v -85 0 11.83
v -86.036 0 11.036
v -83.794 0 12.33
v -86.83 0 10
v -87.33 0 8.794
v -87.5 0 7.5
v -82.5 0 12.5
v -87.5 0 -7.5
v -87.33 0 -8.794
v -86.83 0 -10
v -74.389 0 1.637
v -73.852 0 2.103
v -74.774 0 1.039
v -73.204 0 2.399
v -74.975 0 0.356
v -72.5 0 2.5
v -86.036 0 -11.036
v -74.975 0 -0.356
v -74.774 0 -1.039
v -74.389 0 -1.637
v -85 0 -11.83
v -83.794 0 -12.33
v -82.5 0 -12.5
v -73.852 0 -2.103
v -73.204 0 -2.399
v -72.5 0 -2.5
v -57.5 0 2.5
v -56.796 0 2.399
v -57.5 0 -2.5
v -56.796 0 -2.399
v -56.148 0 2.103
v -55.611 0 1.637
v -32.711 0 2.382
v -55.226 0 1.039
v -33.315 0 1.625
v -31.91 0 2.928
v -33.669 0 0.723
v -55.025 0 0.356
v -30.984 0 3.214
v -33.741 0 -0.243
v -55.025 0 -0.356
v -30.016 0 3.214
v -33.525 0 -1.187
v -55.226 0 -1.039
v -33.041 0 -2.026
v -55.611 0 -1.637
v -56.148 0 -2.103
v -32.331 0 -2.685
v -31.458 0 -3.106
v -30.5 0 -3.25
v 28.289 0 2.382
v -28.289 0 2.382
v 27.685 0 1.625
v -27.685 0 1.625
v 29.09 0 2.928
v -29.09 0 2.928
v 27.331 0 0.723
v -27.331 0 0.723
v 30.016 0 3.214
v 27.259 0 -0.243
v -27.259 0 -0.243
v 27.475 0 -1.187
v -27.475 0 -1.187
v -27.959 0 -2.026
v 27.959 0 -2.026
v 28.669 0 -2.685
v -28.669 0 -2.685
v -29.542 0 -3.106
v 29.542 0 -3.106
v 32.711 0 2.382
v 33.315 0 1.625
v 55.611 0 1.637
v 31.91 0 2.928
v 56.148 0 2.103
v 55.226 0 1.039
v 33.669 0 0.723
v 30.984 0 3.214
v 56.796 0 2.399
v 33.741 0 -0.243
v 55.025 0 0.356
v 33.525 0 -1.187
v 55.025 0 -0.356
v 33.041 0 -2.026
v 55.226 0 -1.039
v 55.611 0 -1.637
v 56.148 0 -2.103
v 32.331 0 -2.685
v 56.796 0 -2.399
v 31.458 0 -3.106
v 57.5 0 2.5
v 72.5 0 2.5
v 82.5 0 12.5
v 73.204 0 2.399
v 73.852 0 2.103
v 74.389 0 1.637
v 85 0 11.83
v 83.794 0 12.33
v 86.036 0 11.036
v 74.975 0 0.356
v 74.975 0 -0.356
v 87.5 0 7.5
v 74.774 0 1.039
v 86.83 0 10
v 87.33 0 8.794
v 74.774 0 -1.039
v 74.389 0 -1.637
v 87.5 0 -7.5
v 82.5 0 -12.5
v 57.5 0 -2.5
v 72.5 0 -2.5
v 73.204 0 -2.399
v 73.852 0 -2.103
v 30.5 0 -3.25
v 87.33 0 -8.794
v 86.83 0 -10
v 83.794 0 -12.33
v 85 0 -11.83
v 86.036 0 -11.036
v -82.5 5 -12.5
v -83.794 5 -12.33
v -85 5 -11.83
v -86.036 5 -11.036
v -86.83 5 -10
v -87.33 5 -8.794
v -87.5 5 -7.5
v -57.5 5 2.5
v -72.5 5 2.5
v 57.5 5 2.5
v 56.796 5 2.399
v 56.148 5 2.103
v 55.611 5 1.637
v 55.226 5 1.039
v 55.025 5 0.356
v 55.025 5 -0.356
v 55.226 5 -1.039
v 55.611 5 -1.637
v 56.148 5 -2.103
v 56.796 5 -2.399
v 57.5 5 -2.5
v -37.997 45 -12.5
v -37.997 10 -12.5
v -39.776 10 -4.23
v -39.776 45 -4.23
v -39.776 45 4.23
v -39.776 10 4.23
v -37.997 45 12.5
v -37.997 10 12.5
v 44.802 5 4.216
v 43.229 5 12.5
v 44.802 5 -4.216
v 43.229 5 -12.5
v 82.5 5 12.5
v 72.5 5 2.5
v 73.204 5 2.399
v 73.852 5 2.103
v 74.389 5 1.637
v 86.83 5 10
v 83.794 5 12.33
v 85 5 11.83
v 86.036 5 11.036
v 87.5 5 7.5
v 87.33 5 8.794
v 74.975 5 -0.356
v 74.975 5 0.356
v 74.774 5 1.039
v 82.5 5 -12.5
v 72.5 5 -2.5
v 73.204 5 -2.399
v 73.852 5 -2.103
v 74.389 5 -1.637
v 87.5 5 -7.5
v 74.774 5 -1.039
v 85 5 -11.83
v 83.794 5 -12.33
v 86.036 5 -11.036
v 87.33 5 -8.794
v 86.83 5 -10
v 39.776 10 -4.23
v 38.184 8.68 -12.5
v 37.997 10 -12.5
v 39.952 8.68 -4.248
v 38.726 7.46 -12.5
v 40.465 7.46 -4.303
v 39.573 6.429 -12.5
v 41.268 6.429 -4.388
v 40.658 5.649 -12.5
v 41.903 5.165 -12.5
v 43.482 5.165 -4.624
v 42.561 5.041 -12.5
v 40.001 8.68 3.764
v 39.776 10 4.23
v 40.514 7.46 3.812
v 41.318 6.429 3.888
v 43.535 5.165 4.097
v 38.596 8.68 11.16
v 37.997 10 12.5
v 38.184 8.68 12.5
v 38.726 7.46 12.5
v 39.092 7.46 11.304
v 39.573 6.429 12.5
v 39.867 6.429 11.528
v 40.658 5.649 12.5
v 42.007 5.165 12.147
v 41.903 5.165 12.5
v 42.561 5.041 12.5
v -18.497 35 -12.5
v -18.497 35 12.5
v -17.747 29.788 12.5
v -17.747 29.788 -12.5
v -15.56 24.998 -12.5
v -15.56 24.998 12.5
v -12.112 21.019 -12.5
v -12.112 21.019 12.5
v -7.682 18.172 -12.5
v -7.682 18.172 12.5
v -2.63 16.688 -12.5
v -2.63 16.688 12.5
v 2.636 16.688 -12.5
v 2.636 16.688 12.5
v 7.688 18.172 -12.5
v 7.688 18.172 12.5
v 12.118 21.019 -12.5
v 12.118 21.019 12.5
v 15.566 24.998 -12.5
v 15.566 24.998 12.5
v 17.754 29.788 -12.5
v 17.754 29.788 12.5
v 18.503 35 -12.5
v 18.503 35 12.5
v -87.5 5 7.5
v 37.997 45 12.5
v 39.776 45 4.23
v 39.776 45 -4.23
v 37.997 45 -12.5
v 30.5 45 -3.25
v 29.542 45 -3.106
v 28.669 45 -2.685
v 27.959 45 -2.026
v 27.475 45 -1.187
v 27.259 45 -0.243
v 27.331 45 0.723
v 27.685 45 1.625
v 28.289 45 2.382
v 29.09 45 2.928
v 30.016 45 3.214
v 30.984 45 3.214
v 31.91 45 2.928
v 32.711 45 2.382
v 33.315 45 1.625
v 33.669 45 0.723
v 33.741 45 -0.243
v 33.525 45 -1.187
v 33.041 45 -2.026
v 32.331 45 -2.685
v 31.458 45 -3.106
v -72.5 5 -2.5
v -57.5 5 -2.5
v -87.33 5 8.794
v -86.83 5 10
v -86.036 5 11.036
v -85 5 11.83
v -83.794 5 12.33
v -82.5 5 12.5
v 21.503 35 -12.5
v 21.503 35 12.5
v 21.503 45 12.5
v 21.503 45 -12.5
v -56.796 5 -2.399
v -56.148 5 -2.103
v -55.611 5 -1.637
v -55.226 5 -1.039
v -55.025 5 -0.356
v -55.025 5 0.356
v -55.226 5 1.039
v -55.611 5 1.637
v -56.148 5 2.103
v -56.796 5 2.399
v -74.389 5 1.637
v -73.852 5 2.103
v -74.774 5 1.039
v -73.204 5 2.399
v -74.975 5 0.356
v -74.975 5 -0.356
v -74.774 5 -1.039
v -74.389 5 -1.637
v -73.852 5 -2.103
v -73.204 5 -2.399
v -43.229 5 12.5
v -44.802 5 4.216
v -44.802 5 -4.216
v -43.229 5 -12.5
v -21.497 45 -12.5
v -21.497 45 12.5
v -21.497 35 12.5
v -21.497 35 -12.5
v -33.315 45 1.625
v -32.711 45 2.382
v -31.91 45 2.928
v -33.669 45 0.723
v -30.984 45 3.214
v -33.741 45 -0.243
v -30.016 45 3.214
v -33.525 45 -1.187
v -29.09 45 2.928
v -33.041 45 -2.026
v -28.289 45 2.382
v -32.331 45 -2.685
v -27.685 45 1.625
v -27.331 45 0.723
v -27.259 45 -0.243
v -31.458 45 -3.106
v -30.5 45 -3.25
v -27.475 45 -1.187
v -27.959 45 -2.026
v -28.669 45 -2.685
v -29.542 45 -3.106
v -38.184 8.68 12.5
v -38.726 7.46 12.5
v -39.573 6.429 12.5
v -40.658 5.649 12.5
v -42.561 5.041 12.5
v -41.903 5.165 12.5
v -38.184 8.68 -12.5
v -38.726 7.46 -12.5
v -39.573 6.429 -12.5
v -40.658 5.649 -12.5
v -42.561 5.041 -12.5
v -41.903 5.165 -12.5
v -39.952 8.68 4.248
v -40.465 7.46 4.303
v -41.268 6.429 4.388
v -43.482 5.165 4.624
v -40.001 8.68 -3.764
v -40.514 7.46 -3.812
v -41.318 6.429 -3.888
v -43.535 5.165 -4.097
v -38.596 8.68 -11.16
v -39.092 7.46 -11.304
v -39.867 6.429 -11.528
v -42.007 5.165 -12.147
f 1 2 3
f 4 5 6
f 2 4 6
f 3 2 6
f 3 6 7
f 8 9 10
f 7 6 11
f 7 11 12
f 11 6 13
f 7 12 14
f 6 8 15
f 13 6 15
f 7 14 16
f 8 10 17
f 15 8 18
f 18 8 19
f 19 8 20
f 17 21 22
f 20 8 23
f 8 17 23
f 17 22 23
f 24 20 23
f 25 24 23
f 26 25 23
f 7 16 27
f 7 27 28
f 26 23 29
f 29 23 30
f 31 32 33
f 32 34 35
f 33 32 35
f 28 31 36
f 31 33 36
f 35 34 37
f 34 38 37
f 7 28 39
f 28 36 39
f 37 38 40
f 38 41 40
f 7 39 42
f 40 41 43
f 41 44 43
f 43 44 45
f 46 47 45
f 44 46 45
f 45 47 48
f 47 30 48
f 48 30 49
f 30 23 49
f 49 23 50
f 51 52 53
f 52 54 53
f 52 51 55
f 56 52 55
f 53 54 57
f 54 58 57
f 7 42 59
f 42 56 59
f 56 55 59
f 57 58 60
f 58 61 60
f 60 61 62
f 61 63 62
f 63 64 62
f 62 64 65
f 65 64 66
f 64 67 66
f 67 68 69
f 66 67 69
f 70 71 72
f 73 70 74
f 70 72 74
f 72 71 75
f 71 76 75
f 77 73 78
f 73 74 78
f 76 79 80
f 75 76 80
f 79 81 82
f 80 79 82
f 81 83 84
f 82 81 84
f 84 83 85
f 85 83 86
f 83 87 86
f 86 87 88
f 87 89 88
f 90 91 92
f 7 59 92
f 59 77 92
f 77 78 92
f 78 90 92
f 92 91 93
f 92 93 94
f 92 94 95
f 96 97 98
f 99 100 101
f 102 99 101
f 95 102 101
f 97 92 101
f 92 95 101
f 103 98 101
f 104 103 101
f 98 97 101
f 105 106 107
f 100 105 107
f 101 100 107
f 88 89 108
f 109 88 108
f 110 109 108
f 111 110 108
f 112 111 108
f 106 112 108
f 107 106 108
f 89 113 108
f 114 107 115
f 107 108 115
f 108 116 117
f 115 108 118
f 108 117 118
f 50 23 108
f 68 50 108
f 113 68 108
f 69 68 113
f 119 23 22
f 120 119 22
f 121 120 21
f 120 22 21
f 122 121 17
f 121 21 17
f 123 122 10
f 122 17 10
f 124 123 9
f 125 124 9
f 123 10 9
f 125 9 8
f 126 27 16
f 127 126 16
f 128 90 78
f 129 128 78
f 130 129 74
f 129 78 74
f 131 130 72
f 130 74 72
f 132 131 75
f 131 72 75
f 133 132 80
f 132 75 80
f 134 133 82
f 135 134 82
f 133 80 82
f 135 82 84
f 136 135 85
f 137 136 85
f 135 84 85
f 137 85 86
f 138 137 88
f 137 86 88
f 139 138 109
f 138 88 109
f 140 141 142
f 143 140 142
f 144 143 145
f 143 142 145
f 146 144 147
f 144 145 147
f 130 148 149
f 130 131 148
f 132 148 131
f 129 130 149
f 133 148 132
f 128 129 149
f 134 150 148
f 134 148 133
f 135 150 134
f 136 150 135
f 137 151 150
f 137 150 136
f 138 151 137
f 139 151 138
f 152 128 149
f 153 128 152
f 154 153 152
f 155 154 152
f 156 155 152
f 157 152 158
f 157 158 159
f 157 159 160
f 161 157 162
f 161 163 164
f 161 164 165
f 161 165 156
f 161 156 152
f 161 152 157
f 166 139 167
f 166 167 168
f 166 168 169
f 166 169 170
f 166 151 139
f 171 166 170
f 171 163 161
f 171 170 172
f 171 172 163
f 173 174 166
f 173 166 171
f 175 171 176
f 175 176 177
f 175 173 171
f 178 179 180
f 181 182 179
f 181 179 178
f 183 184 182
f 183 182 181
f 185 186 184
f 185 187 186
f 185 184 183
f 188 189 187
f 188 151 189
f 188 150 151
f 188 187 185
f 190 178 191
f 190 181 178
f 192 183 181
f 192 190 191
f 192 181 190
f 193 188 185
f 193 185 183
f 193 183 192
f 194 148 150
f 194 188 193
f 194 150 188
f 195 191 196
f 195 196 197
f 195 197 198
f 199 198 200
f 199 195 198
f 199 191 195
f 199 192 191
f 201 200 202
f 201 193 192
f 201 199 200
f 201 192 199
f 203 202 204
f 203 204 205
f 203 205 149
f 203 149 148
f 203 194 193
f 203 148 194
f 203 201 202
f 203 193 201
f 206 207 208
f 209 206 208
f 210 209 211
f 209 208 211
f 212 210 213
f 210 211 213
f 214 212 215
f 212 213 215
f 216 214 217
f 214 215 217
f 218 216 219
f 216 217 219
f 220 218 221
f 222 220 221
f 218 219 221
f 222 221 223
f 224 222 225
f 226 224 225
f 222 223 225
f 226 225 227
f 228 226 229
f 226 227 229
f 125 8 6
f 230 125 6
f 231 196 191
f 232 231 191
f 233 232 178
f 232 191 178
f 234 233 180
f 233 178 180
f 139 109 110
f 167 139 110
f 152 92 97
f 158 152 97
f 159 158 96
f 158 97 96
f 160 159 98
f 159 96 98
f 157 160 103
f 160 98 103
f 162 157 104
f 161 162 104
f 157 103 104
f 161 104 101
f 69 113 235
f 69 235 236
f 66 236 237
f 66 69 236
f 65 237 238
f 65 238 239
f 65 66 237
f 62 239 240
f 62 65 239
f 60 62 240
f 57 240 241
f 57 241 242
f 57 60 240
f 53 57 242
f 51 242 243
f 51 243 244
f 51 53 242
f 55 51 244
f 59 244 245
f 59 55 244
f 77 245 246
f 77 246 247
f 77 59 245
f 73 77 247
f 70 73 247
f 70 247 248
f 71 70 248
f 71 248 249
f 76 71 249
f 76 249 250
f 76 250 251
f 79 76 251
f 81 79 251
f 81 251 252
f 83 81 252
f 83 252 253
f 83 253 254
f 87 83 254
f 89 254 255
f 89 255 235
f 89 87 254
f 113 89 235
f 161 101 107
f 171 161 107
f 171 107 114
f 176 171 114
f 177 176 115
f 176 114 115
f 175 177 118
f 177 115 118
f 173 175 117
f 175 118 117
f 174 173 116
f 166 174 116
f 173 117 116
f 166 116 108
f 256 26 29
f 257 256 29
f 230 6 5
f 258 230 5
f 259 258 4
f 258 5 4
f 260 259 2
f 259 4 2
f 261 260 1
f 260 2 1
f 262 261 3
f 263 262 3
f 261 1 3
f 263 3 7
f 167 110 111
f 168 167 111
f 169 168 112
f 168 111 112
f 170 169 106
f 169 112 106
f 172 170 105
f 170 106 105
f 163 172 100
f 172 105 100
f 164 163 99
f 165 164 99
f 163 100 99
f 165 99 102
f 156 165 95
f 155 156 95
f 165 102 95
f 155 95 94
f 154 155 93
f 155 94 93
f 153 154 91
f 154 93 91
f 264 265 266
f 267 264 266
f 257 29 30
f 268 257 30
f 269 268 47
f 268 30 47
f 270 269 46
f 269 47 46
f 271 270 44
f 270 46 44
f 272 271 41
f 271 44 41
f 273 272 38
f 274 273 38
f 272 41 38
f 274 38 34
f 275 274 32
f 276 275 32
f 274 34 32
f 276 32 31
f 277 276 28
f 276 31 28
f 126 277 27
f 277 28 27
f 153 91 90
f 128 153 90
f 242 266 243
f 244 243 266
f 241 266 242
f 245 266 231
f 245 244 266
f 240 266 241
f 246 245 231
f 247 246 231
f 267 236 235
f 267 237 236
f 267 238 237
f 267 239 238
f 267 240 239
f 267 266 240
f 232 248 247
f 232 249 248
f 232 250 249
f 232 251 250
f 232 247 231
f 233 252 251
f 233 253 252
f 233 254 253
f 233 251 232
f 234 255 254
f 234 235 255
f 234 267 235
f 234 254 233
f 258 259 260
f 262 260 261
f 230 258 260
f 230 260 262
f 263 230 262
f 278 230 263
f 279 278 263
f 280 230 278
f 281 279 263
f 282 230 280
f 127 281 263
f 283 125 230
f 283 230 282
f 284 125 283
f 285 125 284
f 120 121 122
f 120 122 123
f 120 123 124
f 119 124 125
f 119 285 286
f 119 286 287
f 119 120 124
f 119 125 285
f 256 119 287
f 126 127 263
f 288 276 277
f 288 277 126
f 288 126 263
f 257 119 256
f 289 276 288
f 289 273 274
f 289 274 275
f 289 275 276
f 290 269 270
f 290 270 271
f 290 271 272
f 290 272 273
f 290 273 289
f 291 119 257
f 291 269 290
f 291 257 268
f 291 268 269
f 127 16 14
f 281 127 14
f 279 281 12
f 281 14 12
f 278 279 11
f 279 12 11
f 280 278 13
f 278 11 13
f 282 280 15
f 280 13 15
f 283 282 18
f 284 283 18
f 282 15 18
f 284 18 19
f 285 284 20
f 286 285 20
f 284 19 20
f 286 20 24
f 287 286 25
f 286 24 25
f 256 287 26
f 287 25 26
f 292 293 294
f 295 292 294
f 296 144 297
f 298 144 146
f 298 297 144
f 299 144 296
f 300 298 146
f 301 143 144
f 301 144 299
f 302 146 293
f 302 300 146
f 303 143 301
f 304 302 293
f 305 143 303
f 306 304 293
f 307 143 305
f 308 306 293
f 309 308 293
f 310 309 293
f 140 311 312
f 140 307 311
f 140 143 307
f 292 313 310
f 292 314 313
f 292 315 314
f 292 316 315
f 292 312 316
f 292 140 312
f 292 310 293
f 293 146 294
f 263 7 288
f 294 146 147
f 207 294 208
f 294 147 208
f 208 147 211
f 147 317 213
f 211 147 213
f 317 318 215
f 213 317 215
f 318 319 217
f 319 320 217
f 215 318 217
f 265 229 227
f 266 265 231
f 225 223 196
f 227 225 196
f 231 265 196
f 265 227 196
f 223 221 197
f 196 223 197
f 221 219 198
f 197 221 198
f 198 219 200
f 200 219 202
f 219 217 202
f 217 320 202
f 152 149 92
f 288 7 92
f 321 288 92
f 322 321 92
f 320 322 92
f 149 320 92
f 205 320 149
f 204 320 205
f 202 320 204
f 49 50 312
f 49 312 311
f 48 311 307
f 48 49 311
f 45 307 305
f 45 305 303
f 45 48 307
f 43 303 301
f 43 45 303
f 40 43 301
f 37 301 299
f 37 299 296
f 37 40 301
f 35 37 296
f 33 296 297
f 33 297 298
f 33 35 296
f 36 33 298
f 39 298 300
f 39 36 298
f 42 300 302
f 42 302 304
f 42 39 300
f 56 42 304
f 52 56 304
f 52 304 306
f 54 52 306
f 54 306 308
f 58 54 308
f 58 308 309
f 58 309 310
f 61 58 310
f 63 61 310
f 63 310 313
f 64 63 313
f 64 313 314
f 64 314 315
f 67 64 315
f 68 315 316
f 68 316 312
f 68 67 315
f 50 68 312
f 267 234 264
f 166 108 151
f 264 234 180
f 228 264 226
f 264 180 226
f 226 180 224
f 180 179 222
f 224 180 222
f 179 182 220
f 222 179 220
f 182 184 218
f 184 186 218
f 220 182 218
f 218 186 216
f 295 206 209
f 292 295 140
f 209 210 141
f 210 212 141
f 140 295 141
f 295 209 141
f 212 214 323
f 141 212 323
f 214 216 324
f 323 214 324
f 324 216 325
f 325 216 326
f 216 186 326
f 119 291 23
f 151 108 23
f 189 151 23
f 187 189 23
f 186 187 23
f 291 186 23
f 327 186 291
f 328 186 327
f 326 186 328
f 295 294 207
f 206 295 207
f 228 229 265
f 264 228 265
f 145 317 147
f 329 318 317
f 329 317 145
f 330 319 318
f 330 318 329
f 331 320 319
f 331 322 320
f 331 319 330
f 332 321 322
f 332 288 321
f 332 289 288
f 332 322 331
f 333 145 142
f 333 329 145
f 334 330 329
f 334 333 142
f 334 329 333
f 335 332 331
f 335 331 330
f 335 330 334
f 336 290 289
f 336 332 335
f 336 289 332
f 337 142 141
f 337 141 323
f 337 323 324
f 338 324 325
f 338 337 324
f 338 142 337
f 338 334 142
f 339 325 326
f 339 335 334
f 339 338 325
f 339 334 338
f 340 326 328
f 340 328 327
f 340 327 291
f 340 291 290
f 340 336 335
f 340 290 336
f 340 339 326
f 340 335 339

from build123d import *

# Parameters (mm, degrees)
BOSS_EXTRUDE5_DEPTH   = 5
BOSS_EXTRUDE5_2_DEPTH = 5
SKETCH1_8_R           = 3.25
BOSS_EXTRUDE6_DEPTH   = 45
FILLET3_R             = 5
FILLET4_R             = 5
CUT_EXTRUDE1_DEPTH    = 45


with BuildPart() as part:
    # Sketch1 → Boss-Extrude5 (new body)
    with BuildSketch(Plane(origin=(0, 0, 0), x_dir=(1, 0, 0), z_dir=(0, 1, 0))):
        with BuildLine():
            ThreePointArc((-82.5, 12.5), (-86.035533906, 11.035533906), (-87.5, 7.5))
            Line((-87.5, 7.5), (-87.5, -7.5))
            ThreePointArc((-87.5, -7.5), (-86.035533906, -11.035533906), (-82.5, -12.5))
            Line((-82.5, -12.5), (-37.996710384, -12.5))
            ThreePointArc((-37.996710384, -12.5), (-40, 0), (-37.996710384, 12.5))
            Line((-37.996710384, 12.5), (-82.5, 12.5))
        make_face()
        with BuildLine():
            ThreePointArc((-72.5, -2.5), (-75, 0), (-72.5, 2.5))
            Line((-72.5, 2.5), (-57.5, 2.5))
            ThreePointArc((-57.5, 2.5), (-55, 0), (-57.5, -2.5))
            Line((-57.5, -2.5), (-72.5, -2.5))
        make_face(mode=Mode.SUBTRACT)
    extrude(amount=BOSS_EXTRUDE5_DEPTH)



with BuildPart() as body_2:
    # Sketch1 → Boss-Extrude5 2 (new body)
    with BuildSketch(Plane(origin=(0, 0, 0), x_dir=(1, 0, 0), z_dir=(0, 1, 0))):
        with BuildLine():
            ThreePointArc((37.996710384, 12.5), (40, 0), (37.996710384, -12.5))
            Line((37.996710384, -12.5), (82.5, -12.5))
            ThreePointArc((82.5, -12.5), (86.035533906, -11.035533906), (87.5, -7.5))
            Line((87.5, -7.5), (87.5, 7.5))
            ThreePointArc((87.5, 7.5), (86.035533906, 11.035533906), (82.5, 12.5))
            Line((82.5, 12.5), (37.996710384, 12.5))
        make_face()
        with BuildLine():
            Line((72.5, -2.5), (57.5, -2.5))
            ThreePointArc((57.5, -2.5), (55, 0), (57.5, 2.5))
            Line((57.5, 2.5), (72.5, 2.5))
            ThreePointArc((72.5, 2.5), (75, 0), (72.5, -2.5))
        make_face(mode=Mode.SUBTRACT)
    extrude(amount=BOSS_EXTRUDE5_2_DEPTH)


with BuildPart() as part_1:
    add(part.part)

    add(body_2.part)  # Boss-Extrude6 merges body 2
    # Sketch1<8> → Boss-Extrude6 (add)
    with BuildSketch(Plane(origin=(0, 0, 0), x_dir=(1, 0, 0), z_dir=(0, 1, 0))):
        with BuildLine():
            ThreePointArc((-37.996710384, 12.5), (-40, 0), (-37.996710384, -12.5))
            Line((-37.996710384, -12.5), (37.996710384, -12.5))
            ThreePointArc((37.996710384, -12.5), (40, 0), (37.996710384, 12.5))
            Line((37.996710384, 12.5), (-37.996710384, 12.5))
        make_face()
        with Locations((-30.5, 0)):
            Circle(SKETCH1_8_R, mode=Mode.SUBTRACT)
        with Locations((30.5, 0)):
            Circle(SKETCH1_8_R, mode=Mode.SUBTRACT)
    extrude(amount=BOSS_EXTRUDE6_DEPTH)

    # Fillet3
    fillet3_edges = [part_1.edges().sort_by_distance(p)[0] for p in [
        (-40, 5, 0),
    ]]
    fillet(fillet3_edges, radius=FILLET3_R)

    # Fillet4
    fillet4_edges = [part_1.edges().sort_by_distance(p)[0] for p in [
        (40, 5, 0),
    ]]
    fillet(fillet4_edges, radius=FILLET4_R)

    # Sketch4 → Cut-Extrude1 (cut)
    with BuildSketch(Plane.XY.offset(12.5)):
        with BuildLine():
            Line((-21.496710384, 45), (-21.496710384, 35))
            Line((-21.496710384, 35), (-18.496710384, 35))
            ThreePointArc((-18.496710384, 35), (0.003289616, 16.5), (18.503289616, 35))
            Line((18.503289616, 35), (21.503289616, 35))
            Line((21.503289616, 35), (21.503289616, 45))
            Line((21.503289616, 45), (-21.496710384, 45))
        make_face()
    extrude(amount=-CUT_EXTRUDE1_DEPTH, mode=Mode.SUBTRACT)


solid = part_1.part
